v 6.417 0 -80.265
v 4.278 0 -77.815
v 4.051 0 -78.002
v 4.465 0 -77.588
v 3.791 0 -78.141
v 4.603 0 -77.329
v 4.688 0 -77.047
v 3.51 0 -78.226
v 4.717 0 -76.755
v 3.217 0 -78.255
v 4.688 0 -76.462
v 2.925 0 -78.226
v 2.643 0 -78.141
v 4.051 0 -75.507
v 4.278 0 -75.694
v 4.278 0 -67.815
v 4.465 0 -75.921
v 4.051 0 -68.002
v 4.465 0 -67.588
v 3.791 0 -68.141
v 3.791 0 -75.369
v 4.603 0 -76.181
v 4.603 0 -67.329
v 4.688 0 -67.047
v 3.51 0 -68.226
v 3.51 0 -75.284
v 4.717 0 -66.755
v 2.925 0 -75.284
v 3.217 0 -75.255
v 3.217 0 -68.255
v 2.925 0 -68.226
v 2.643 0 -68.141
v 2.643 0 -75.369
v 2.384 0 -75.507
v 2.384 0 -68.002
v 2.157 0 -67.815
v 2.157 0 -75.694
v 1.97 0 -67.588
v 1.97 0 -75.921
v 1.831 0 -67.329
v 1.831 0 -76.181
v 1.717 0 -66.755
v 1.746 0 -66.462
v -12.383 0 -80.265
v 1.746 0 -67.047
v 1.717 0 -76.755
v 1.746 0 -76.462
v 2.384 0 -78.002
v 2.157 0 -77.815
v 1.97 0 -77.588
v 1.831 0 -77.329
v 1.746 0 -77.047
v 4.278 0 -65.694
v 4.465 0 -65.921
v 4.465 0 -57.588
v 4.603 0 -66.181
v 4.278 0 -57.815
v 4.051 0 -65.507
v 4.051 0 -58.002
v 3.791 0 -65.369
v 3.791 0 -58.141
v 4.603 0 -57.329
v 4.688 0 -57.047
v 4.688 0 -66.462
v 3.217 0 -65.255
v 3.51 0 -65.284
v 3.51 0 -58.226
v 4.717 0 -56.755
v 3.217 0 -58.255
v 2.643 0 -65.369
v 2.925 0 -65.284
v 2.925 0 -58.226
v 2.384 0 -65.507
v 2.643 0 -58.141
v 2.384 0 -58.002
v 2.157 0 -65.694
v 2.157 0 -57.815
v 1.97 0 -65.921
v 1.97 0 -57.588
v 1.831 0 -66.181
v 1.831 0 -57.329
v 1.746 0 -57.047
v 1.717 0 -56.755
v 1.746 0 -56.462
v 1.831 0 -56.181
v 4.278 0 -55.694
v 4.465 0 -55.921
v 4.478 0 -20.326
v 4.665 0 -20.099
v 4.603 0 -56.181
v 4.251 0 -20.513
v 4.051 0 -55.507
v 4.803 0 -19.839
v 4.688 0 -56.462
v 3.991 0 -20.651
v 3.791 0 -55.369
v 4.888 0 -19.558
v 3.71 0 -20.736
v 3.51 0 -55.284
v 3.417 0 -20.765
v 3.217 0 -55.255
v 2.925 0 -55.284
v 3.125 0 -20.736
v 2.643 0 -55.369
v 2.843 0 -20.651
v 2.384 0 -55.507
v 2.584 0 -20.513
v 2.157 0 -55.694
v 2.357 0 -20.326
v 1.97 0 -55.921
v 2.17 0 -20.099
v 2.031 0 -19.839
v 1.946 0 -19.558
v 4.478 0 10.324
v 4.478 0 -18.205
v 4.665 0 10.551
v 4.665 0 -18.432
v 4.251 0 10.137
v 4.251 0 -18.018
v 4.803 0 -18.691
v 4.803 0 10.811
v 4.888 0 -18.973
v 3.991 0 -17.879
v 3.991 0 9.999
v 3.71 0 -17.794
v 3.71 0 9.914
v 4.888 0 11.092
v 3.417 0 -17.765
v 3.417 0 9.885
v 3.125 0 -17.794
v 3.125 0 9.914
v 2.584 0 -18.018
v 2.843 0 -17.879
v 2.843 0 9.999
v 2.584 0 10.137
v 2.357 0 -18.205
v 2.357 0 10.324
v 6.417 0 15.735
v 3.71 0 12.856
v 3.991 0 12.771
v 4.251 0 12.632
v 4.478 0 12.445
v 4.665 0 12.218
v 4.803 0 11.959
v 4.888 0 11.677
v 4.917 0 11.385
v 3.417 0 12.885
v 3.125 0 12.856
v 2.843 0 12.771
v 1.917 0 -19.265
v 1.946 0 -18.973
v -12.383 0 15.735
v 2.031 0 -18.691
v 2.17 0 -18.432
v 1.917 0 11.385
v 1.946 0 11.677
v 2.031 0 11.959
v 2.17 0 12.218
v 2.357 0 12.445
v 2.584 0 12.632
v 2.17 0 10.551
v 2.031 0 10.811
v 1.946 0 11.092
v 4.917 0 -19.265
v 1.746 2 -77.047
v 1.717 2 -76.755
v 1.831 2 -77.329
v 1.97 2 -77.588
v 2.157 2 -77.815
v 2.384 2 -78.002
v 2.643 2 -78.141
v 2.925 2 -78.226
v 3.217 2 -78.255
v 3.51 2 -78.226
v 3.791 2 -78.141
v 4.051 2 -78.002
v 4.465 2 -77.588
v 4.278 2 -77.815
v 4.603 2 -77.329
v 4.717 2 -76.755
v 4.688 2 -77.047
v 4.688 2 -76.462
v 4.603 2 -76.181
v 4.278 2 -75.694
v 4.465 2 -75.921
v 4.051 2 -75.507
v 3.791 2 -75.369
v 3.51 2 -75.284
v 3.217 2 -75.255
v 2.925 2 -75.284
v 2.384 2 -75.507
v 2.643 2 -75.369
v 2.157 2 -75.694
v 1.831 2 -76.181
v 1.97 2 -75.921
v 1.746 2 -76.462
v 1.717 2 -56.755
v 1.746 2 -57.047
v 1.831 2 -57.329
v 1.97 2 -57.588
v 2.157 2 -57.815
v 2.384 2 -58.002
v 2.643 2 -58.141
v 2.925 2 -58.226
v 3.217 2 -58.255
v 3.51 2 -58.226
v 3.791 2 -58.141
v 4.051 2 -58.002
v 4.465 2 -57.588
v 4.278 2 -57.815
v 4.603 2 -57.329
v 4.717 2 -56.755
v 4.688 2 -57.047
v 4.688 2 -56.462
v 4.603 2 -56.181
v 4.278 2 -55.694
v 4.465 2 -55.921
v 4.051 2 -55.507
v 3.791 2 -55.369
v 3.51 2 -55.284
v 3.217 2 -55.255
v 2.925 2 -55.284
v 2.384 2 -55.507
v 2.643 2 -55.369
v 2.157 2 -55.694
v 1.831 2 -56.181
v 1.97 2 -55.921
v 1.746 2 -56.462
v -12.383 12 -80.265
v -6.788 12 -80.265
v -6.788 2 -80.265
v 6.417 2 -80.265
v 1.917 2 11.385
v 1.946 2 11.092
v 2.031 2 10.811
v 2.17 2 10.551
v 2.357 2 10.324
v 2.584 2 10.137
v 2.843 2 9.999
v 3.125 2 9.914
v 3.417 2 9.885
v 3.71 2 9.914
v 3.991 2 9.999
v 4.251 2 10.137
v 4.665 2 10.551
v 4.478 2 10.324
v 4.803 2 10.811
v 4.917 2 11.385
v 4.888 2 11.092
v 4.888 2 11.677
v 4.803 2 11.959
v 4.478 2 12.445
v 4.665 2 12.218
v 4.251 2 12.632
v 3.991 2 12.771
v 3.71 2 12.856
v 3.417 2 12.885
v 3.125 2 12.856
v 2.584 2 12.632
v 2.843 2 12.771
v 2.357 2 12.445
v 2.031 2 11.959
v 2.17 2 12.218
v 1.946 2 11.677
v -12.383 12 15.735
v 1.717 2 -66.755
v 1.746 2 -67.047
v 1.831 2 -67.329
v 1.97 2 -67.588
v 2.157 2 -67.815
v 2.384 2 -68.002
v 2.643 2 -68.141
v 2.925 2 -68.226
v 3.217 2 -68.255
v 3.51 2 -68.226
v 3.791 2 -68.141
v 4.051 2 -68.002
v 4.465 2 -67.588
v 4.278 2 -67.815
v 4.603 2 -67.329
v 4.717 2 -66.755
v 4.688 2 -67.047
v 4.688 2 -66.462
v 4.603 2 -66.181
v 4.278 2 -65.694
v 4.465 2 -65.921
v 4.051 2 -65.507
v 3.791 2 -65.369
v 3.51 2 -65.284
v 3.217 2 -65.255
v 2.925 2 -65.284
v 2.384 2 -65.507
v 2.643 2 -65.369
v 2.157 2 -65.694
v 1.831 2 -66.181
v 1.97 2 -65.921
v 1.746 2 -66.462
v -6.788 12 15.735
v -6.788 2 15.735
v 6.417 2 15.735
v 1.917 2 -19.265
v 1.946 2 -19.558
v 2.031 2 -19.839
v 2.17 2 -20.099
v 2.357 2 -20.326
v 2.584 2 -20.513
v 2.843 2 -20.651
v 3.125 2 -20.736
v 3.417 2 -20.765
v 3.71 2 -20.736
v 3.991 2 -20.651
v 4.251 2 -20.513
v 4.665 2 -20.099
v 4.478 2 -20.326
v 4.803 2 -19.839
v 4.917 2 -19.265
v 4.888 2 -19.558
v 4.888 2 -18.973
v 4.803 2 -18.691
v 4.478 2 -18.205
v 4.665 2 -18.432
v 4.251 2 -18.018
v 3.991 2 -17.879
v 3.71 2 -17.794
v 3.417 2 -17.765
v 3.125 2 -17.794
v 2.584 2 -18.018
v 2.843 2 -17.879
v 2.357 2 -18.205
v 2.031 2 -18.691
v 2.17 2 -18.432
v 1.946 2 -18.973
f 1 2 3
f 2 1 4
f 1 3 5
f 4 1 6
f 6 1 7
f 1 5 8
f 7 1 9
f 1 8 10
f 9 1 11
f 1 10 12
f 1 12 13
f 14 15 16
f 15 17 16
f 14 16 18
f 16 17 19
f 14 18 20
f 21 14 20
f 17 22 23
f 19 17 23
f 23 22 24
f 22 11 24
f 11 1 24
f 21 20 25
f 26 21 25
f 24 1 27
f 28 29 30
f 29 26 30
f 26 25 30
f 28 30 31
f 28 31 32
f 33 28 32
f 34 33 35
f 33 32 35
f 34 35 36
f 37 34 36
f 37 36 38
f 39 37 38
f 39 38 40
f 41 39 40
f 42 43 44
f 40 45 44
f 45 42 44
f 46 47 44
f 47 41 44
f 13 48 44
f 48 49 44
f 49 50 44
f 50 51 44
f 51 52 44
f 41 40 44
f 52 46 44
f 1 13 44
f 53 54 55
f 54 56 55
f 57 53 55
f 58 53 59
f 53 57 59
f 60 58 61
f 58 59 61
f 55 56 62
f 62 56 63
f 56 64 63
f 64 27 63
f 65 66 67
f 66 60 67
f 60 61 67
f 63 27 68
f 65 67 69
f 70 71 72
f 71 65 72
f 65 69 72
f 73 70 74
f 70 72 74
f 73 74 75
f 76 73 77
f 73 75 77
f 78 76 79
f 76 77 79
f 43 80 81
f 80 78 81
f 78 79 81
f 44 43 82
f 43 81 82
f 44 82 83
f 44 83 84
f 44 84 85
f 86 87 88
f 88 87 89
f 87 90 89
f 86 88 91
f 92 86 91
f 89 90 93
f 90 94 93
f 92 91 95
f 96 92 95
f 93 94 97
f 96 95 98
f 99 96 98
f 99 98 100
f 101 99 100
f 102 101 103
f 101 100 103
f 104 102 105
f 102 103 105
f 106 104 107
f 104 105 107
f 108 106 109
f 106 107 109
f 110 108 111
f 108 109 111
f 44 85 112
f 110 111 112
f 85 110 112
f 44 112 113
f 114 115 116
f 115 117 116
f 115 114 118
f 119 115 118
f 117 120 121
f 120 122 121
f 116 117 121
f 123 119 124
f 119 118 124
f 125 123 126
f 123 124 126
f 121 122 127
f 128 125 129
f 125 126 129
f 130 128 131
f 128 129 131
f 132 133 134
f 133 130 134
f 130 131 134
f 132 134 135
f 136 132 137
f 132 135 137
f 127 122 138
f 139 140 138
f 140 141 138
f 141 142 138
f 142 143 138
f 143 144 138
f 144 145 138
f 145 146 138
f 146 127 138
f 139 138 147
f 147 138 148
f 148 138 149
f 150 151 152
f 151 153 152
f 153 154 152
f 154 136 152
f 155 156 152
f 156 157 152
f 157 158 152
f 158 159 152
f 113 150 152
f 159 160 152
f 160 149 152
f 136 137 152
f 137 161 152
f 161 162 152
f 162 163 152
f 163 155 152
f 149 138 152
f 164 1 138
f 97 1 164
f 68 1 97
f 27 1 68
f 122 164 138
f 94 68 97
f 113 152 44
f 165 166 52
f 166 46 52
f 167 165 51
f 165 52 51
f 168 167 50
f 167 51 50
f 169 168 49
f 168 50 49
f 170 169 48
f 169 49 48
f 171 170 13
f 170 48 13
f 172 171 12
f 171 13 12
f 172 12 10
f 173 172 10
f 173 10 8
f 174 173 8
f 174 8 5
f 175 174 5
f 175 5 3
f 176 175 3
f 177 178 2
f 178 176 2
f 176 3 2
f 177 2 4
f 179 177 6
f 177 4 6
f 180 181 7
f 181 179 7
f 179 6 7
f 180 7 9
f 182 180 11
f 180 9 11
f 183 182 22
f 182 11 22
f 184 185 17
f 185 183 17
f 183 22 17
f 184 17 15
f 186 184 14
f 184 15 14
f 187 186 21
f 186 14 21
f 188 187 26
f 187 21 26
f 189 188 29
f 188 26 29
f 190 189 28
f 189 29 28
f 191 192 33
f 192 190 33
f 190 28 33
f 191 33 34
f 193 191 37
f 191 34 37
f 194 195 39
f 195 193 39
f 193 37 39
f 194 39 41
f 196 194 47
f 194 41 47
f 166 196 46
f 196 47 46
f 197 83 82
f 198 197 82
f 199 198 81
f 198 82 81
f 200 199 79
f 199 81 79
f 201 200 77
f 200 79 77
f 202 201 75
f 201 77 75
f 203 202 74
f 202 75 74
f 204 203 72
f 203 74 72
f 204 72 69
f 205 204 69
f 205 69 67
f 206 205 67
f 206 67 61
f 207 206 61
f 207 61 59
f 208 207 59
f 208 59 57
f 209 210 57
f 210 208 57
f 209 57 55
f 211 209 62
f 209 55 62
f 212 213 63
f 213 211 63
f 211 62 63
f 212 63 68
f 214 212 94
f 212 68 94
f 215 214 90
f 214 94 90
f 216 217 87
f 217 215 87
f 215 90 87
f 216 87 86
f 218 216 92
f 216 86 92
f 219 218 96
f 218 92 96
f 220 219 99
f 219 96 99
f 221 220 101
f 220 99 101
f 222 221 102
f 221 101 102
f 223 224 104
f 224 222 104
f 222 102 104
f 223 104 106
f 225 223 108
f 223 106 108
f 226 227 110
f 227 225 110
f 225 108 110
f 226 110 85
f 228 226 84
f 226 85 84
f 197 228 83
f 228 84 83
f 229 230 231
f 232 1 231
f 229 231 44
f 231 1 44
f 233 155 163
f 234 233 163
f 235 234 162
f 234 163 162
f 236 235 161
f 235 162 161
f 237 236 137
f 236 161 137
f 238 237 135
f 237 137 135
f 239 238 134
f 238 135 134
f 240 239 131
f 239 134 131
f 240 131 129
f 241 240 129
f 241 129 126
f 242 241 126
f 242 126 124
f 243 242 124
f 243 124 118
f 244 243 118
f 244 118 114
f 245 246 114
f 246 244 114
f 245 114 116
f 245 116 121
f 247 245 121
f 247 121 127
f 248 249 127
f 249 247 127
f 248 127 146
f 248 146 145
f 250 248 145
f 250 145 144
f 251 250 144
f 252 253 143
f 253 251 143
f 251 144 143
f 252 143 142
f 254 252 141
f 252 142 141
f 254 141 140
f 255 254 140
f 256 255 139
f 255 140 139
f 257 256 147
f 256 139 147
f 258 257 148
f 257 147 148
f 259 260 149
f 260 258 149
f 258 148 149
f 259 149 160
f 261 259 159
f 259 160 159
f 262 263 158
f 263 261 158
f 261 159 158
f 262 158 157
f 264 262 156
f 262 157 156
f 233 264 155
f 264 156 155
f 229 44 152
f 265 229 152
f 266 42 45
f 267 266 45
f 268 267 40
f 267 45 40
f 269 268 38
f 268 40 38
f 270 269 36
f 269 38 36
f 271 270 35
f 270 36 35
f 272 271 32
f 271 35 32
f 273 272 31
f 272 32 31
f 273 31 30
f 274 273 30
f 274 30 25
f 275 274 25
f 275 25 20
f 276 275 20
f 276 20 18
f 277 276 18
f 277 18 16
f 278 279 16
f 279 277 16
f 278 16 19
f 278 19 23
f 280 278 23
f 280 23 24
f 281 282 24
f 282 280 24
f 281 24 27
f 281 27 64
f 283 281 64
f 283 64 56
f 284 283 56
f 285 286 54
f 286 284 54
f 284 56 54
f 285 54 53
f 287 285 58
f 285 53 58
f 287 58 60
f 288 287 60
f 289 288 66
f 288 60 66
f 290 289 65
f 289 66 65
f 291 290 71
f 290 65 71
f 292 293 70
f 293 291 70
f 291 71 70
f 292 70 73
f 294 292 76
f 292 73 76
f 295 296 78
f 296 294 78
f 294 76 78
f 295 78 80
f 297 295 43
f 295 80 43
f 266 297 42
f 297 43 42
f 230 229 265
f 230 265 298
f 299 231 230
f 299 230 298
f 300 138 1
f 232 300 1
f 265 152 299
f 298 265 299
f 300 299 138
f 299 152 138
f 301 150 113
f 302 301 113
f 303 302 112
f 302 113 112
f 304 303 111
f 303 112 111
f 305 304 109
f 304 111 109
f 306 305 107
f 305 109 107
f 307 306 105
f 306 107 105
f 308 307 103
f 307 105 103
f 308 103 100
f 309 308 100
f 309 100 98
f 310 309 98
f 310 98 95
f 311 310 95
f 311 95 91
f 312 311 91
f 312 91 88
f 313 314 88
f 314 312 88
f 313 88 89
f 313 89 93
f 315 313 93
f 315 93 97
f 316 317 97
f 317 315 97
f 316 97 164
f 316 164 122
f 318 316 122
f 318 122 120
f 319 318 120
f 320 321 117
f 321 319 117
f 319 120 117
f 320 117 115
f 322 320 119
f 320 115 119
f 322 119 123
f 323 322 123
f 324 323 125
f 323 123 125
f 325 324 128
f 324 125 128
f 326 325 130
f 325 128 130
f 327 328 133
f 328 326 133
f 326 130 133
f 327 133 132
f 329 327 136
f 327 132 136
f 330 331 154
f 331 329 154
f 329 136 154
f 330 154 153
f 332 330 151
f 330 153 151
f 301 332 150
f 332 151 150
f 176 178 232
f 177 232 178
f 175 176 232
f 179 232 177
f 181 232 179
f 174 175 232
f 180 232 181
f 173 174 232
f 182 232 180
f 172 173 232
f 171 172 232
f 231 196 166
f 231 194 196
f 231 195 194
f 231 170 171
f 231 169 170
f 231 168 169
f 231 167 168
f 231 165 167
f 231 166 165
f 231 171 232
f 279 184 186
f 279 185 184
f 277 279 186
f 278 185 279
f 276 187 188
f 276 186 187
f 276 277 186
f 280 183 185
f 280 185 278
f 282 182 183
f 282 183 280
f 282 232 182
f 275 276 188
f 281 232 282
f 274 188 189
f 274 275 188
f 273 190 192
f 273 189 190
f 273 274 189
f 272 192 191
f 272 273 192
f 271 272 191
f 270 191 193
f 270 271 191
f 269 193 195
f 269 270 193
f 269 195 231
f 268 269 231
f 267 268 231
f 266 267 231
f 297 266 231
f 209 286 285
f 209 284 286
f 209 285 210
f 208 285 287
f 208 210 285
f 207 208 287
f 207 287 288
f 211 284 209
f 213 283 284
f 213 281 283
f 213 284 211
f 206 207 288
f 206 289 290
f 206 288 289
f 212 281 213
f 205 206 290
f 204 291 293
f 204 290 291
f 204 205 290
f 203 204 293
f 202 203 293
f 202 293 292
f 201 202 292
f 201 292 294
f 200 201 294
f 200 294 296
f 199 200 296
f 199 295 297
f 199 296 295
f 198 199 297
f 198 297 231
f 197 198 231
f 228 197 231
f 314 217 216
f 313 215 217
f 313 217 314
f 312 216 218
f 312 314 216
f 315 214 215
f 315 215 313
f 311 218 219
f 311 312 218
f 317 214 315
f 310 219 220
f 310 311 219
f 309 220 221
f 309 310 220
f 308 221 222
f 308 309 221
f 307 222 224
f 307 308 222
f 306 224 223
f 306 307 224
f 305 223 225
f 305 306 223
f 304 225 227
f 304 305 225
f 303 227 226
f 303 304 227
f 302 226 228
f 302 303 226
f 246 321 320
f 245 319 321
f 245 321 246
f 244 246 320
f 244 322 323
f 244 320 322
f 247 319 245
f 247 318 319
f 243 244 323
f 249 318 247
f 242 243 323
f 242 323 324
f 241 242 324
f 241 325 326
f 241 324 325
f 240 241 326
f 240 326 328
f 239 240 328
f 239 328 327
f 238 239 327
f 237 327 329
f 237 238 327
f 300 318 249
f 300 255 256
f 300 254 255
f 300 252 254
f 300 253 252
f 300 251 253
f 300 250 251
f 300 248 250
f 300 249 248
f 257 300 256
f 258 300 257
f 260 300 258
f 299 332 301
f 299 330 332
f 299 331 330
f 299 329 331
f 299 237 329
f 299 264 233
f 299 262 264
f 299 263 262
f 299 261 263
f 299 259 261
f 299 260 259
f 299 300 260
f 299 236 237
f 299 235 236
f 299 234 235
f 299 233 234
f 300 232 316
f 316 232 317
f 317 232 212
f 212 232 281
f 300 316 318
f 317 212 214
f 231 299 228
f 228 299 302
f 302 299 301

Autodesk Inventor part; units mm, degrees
ref_plane "YZ Plane" through (0, 0, 0) normal (1, 0, 0) x (0, 1, 0)
ref_plane "XZ Plane" through (0, 0, 0) normal (0, 1, 0) x (-1, 0, 0)
ref_plane "XY Plane" through (0, 0, 0) normal (0, 0, 1) x (1, 0, 0)
sketch "Sketch1" plane through (0, 0, 0) normal (0, 1, 0) x (-1, 0, 0)
  line L0 (12.3827, 15.7347) -> (-6.4173, 15.7347)
  line L1 (-6.4173, 15.7347) -> (-6.4173, -80.2653)
  line L2 (-6.4173, -80.2653) -> (12.3827, -80.2653)
  line L3 (12.3827, -80.2653) -> (12.3827, 15.7347)
  circle A0 centre (-3.4173, 11.3847) radius 1.5
  circle A1 centre (-3.4173, -19.2653) radius 1.5
  circle A2 centre (-3.2173, -76.7547) radius 1.5
  circle A3 centre (-3.2173, -66.7547) radius 1.5
  circle A4 centre (-3.2173, -56.7547) radius 1.5
  point P0 (0, 0)
  dimension "d0" = 3
  dimension "d1" = 18.8
  dimension "d2" = 96
  dimension "d3" = 3
  dimension "d4" = 30.65
  dimension "d5" = 35
  dimension "d6" = 3
  dimension "d7" = 3
  dimension "d8" = 3
  dimension "d9" = 3
  dimension "d10" = 3
  dimension "d11" = 10
  dimension "d12" = 10
  dimension "d13" = 3.2
extrude "Extrusion1" add sketch "Sketch1" along normal blind 2
sketch "Sketch2" plane through (0, 2, 0) normal (0, 1, 0) x (1, 0, 0)
  line L0 (6.4173, 80.2653) -> (-12.3827, 80.2653) projected
  line L1 (-12.3827, -15.7347) -> (6.4173, -15.7347) projected
  line L2 (-12.3827, 80.2653) -> (-6.7885, 80.2653)
  line L3 (-6.7885, 80.2653) -> (-6.7885, -15.7347)
  line L4 (-6.7885, -15.7347) -> (-12.3827, -15.7347)
  line L5 (-12.3827, -15.7347) -> (-12.3827, 80.2653)
  point P0 (0, 0)
extrude "Extrusion2" add sketch "Sketch2" along normal blind 10
properties part number "connectStepper"
